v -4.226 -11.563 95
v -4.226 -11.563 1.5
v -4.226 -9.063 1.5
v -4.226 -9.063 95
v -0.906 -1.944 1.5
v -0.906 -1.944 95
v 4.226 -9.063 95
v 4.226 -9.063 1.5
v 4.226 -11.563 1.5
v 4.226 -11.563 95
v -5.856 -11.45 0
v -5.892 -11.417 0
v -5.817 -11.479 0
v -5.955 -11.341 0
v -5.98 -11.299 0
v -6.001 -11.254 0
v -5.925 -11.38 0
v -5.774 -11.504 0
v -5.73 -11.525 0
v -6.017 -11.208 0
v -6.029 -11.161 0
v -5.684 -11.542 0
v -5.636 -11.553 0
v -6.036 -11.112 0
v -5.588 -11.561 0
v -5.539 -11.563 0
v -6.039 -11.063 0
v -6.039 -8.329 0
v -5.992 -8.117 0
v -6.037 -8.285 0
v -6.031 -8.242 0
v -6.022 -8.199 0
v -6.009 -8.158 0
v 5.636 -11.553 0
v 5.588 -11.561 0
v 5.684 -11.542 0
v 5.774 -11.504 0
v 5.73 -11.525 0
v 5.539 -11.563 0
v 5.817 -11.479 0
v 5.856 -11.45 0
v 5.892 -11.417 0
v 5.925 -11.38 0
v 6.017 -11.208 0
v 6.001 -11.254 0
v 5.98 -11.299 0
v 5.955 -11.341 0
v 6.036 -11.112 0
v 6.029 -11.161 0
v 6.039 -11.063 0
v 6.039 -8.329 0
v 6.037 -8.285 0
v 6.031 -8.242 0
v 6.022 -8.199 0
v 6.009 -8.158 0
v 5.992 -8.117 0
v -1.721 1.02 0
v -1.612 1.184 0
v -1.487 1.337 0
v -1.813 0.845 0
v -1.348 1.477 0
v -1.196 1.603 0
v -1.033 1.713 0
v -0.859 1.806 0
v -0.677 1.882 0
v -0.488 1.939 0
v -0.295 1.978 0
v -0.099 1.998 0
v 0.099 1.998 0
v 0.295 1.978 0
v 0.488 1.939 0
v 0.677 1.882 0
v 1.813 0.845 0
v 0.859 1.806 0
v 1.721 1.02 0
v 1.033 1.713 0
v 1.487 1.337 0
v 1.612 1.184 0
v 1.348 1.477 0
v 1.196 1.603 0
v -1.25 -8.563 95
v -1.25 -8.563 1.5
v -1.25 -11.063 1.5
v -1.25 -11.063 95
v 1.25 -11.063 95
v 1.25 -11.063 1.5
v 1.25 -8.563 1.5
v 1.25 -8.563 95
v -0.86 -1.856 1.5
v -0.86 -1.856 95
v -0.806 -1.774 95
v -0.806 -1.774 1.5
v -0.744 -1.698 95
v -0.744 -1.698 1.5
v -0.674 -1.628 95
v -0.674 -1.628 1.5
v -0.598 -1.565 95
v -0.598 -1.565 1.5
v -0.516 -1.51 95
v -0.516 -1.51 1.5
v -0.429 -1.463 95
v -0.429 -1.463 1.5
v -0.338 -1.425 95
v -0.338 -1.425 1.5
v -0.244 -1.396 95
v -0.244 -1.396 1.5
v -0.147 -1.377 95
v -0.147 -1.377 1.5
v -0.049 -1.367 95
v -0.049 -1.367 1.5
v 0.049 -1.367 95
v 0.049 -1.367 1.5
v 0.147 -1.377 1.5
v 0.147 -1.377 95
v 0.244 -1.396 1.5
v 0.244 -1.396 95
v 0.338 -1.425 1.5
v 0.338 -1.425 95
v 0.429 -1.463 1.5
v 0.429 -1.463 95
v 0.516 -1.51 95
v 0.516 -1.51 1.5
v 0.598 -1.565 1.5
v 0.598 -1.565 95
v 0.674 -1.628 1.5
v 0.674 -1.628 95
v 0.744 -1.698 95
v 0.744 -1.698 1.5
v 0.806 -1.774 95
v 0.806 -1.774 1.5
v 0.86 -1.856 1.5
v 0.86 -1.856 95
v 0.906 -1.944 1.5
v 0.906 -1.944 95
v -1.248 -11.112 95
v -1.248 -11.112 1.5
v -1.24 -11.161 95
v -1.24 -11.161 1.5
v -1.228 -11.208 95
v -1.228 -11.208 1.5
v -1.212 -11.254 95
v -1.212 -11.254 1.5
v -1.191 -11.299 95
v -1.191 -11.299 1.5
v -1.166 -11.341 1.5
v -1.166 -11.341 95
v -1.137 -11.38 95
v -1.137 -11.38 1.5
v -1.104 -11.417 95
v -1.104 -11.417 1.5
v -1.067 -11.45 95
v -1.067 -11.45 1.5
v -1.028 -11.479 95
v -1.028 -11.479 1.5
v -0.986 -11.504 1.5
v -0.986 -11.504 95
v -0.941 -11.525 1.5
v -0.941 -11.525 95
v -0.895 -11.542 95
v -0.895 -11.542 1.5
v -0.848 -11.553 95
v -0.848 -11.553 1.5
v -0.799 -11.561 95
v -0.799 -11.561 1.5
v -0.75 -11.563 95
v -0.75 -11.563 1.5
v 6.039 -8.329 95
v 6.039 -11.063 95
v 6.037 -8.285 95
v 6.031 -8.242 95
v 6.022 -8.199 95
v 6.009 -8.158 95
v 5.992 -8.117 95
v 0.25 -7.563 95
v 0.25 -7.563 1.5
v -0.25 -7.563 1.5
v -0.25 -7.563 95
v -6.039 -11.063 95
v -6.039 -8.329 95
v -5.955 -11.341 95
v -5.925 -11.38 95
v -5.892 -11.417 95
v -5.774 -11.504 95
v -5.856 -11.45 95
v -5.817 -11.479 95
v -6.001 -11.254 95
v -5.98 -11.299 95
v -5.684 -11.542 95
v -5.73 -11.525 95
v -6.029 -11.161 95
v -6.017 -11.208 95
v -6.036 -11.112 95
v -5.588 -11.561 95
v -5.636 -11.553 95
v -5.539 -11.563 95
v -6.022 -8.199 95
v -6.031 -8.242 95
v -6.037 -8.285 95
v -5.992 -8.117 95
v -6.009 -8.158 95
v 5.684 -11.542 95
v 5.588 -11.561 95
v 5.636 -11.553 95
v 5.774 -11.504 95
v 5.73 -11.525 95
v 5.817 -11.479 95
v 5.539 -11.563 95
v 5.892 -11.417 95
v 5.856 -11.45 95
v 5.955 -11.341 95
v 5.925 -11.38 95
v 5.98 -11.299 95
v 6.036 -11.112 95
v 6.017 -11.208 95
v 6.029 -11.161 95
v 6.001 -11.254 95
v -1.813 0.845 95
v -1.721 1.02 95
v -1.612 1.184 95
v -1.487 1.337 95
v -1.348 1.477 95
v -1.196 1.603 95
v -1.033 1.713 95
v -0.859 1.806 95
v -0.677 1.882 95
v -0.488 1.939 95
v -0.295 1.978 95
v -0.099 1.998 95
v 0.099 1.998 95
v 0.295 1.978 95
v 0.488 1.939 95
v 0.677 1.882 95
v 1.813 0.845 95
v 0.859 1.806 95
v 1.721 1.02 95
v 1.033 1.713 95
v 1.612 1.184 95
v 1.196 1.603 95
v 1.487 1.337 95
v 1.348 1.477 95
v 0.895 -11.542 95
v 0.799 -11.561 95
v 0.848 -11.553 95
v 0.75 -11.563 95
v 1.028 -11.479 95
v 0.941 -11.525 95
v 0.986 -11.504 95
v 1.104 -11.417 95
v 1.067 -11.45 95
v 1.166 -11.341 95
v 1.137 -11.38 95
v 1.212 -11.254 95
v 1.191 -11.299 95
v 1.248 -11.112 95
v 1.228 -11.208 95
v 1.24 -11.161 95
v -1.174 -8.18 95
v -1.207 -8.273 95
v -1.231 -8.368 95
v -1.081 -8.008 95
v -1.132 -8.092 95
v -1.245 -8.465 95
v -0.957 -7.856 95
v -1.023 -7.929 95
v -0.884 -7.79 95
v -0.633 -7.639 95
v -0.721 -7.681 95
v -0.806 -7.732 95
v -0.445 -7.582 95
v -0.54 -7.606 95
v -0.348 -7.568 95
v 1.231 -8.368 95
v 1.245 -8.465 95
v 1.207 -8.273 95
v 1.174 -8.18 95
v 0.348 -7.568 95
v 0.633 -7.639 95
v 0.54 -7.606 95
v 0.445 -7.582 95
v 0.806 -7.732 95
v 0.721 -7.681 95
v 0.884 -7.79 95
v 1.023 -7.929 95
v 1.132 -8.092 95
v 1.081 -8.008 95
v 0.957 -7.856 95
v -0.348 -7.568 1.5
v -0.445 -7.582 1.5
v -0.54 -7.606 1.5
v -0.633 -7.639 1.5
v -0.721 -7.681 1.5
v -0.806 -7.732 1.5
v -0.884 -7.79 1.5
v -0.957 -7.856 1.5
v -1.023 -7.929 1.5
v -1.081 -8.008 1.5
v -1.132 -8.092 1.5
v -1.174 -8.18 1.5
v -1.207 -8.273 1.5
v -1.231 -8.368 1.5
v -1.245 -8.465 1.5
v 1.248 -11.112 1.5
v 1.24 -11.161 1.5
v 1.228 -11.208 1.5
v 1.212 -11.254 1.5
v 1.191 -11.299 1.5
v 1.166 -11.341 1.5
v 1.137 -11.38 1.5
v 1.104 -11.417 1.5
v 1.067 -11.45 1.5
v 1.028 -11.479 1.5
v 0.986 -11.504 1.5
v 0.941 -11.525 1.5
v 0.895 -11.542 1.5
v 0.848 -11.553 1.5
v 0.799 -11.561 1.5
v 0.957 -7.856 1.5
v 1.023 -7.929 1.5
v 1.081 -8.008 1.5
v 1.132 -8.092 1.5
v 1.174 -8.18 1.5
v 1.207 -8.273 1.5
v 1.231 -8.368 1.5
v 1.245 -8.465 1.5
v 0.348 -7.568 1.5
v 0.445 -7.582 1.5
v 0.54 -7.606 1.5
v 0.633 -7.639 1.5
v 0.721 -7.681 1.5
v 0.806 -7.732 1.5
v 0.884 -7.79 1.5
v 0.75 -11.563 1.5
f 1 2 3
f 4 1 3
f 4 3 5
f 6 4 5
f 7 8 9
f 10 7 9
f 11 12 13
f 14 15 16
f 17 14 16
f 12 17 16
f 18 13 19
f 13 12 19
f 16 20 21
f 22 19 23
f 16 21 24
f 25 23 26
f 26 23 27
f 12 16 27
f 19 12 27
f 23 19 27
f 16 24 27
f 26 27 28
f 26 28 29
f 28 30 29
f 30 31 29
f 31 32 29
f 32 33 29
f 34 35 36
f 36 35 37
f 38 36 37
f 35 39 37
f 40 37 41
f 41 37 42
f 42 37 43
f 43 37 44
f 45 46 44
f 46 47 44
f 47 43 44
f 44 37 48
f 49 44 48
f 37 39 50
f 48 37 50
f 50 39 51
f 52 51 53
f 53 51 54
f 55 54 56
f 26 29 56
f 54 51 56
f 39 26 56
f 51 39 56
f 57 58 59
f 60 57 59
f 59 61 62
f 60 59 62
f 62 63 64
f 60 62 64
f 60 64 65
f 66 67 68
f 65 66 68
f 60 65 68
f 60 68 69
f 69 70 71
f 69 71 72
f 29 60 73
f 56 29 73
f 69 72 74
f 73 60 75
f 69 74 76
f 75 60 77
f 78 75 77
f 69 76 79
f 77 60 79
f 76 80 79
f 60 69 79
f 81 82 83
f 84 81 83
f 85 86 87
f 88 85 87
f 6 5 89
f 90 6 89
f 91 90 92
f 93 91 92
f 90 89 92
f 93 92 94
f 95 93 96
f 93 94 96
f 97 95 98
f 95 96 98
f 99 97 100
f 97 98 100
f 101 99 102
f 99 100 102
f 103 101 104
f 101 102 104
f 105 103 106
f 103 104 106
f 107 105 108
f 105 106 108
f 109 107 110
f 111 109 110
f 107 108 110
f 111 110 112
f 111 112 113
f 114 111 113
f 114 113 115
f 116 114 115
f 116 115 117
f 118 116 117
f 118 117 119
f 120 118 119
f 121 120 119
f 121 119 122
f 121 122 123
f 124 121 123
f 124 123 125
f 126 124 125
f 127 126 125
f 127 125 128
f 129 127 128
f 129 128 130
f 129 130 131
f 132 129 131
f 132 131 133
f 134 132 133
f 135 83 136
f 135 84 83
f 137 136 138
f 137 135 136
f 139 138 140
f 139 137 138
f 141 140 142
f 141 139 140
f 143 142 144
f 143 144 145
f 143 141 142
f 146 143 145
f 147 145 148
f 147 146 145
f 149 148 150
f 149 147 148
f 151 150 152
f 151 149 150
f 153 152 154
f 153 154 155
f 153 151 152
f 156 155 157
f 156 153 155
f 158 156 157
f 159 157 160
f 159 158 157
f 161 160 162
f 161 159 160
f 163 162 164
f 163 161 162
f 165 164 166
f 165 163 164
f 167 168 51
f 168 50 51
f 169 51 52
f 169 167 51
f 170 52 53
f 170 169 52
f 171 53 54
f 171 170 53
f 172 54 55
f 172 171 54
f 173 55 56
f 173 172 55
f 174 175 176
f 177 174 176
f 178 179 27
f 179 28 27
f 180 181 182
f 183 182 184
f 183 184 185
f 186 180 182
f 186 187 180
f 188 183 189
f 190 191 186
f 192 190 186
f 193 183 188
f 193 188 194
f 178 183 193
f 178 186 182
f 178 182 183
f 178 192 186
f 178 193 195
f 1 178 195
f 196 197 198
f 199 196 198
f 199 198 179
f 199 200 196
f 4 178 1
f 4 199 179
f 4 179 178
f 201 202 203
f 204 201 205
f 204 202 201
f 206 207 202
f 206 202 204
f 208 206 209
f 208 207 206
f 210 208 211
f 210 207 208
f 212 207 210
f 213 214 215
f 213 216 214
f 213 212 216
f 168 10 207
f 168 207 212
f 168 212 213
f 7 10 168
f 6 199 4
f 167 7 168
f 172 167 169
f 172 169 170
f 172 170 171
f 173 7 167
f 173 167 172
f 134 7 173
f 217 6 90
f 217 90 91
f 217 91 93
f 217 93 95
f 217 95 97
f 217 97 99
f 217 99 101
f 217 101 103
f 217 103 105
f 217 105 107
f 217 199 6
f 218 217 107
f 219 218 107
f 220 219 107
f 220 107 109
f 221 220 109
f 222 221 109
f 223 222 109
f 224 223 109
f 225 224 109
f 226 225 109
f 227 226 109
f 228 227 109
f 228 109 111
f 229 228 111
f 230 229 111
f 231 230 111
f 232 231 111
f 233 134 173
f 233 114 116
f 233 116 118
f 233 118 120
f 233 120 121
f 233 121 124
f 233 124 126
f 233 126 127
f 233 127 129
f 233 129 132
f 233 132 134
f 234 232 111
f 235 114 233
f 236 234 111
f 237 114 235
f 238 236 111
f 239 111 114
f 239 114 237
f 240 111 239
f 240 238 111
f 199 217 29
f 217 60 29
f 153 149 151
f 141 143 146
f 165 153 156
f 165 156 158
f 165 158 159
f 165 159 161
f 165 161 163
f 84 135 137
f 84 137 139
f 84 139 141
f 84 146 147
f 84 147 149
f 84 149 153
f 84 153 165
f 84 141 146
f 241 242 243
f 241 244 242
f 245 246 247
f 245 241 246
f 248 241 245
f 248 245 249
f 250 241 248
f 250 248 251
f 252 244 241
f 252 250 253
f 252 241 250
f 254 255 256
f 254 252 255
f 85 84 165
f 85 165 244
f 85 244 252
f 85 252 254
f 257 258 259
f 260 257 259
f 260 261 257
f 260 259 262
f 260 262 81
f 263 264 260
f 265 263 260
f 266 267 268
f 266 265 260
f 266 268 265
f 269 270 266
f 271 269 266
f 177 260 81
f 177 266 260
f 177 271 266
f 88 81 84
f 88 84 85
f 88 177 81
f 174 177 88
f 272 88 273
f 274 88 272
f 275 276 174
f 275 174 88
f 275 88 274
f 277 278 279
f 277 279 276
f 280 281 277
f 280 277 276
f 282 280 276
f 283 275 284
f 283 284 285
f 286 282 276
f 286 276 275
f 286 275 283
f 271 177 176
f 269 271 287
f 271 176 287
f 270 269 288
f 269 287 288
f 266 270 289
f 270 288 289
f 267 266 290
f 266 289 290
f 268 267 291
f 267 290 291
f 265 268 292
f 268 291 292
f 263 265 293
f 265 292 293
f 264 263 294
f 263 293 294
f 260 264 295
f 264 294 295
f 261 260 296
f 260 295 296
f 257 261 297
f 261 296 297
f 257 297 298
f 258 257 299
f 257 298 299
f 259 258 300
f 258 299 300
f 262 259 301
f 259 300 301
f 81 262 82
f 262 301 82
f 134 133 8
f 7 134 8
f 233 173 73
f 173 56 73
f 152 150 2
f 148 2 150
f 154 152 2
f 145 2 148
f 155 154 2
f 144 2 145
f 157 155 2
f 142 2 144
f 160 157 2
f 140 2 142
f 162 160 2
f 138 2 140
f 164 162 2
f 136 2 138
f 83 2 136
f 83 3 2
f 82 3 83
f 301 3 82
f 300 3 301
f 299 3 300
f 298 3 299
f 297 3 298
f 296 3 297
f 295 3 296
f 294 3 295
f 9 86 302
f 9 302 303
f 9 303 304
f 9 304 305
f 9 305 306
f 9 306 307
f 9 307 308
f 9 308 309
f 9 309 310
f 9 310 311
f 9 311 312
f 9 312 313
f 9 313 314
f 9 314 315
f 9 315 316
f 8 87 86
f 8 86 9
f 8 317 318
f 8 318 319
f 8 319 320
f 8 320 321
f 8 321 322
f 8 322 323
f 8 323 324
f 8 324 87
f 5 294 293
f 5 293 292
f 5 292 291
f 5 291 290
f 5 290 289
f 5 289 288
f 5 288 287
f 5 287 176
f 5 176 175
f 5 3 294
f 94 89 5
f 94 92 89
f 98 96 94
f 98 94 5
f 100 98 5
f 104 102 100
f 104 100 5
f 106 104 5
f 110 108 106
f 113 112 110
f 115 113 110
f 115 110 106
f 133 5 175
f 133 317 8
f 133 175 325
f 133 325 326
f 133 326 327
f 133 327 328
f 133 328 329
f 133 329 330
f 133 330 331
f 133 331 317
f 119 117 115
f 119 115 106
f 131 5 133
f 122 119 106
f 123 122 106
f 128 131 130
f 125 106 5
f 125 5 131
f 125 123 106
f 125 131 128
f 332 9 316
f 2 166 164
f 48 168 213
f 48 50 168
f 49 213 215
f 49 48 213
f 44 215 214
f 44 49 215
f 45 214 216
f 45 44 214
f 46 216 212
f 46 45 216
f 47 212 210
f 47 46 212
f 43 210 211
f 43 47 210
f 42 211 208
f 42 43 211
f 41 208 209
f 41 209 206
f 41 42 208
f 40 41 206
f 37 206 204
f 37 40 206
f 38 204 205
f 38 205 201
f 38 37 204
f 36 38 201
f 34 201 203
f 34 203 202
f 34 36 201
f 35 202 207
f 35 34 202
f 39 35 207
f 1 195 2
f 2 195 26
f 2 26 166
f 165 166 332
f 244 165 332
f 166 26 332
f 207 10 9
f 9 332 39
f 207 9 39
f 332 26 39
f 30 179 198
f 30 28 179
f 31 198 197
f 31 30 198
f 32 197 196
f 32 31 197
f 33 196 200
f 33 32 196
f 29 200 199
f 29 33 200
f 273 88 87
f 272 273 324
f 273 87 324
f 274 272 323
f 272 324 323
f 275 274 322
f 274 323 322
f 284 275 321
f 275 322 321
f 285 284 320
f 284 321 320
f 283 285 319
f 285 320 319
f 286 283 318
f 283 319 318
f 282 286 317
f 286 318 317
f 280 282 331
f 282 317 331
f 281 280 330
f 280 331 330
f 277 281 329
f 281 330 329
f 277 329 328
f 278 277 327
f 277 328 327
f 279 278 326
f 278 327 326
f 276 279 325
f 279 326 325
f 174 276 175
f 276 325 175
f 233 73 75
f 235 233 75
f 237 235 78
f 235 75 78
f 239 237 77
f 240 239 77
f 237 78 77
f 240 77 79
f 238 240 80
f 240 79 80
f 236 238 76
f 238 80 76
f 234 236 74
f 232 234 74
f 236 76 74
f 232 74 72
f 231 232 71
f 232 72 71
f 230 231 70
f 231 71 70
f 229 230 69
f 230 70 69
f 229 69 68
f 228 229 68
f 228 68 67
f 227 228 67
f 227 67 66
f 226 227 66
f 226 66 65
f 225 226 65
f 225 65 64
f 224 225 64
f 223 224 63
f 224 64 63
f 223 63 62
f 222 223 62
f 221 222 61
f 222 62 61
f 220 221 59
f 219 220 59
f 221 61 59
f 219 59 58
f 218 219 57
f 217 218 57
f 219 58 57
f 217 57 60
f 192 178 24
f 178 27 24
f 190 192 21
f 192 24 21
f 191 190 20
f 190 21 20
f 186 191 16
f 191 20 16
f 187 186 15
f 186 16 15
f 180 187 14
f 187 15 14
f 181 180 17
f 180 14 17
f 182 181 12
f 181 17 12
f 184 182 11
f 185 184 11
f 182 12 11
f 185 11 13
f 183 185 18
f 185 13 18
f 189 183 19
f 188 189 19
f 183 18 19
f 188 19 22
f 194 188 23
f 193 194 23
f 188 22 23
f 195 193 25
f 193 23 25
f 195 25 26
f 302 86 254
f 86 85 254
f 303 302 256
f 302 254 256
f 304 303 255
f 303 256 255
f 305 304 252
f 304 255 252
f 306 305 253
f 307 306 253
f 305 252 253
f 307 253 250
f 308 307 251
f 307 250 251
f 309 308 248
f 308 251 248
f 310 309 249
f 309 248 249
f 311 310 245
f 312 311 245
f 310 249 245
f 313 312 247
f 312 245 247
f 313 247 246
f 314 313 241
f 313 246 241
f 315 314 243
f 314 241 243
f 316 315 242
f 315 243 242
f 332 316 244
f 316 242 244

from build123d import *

# Parameters (mm, degrees)
F1_DEPTH = 1.5
F2_DEPTH = 95
F3_R     = 0.5


# Not quite as in the source:
# - a feature names something its author has since deleted; it is built from what else it names


with BuildPart() as f1:
    # F0 (on Top) → F1 (new body)
    with BuildSketch(Plane.XY):
        with BuildLine():
            ThreePointArc((0.906307787, -1.9435833214), (0, -1.3662015832), (-0.906307787, -1.9435833214))
            Line((-0.906307787, -1.9435833214), (-4.2261826174, -9.0630778704))
            Line((-4.2261826174, -9.0630778704), (-4.2261826174, -11.5630778704))
            Line((-4.2261826174, -11.5630778704), (-1.25, -11.5630778704))
            Line((-1.25, -11.5630778704), (-1.25, -8.5630778704))
            ThreePointArc((-1.25, -8.5630778704), (-0.9571067812, -7.8559710892), (-0.25, -7.5630778704))
            Line((-0.25, -7.5630778704), (0.25, -7.5630778704))
            ThreePointArc((0.25, -7.5630778704), (0.9571067812, -7.8559710892), (1.25, -8.5630778704))
            Line((1.25, -8.5630778704), (1.25, -11.5630778704))
            Line((1.25, -11.5630778704), (4.2261826174, -11.5630778704))
            Line((4.2261826174, -11.5630778704), (4.2261826174, -9.0630778704))
            Line((4.2261826174, -9.0630778704), (0.906307787, -1.9435833214))
        make_face()
        with BuildLine():
            Line((-4.2261826174, -9.0630778704), (-0.906307787, -1.9435833214))
            ThreePointArc((-0.906307787, -1.9435833214), (0, -1.3662015832), (0.906307787, -1.9435833214))
            Line((0.906307787, -1.9435833214), (4.2261826174, -9.0630778704))
            Line((4.2261826174, -9.0630778704), (4.2261826174, -11.5630778704))
            Line((4.2261826174, -11.5630778704), (6.0387981915, -11.5630778704))
            Line((6.0387981915, -11.5630778704), (6.0387981915, -8.2178413469))
            Line((6.0387981915, -8.2178413469), (1.8126155741, 0.8452365235))
            ThreePointArc((1.8126155741, 0.8452365235), (0, 2), (-1.8126155741, 0.8452365235))
            Line((-1.8126155741, 0.8452365235), (-6.0387981915, -8.2178413469))
            Line((-6.0387981915, -8.2178413469), (-6.0387981915, -11.5630778704))
            Line((-6.0387981915, -11.5630778704), (-4.2261826174, -11.5630778704))
            Line((-4.2261826174, -11.5630778704), (-4.2261826174, -9.0630778704))
        make_face()
        with BuildLine():
            Line((-1.25, -8.5630778704), (-1.25, -11.5630778704))
            Line((-1.25, -11.5630778704), (1.25, -11.5630778704))
            Line((1.25, -11.5630778704), (1.25, -8.5630778704))
            ThreePointArc((1.25, -8.5630778704), (0.9571067812, -7.8559710892), (0.25, -7.5630778704))
            Line((0.25, -7.5630778704), (-0.25, -7.5630778704))
            ThreePointArc((-0.25, -7.5630778704), (-0.9571067812, -7.8559710892), (-1.25, -8.5630778704))
        make_face()
    extrude(amount=F1_DEPTH)

    # F0 (on Top) → F2 (join)
    with BuildSketch(Plane.XY):
        with BuildLine():
            Line((-4.2261826174, -9.0630778704), (-0.906307787, -1.9435833214))
            ThreePointArc((-0.906307787, -1.9435833214), (0, -1.3662015832), (0.906307787, -1.9435833214))
            Line((0.906307787, -1.9435833214), (4.2261826174, -9.0630778704))
            Line((4.2261826174, -9.0630778704), (4.2261826174, -11.5630778704))
            Line((4.2261826174, -11.5630778704), (6.0387981915, -11.5630778704))
            Line((6.0387981915, -11.5630778704), (6.0387981915, -8.2178413469))
            Line((6.0387981915, -8.2178413469), (1.8126155741, 0.8452365235))
            ThreePointArc((1.8126155741, 0.8452365235), (0, 2), (-1.8126155741, 0.8452365235))
            Line((-1.8126155741, 0.8452365235), (-6.0387981915, -8.2178413469))
            Line((-6.0387981915, -8.2178413469), (-6.0387981915, -11.5630778704))
            Line((-6.0387981915, -11.5630778704), (-4.2261826174, -11.5630778704))
            Line((-4.2261826174, -11.5630778704), (-4.2261826174, -9.0630778704))
        make_face()
        with BuildLine():
            Line((-1.25, -8.5630778704), (-1.25, -11.5630778704))
            Line((-1.25, -11.5630778704), (1.25, -11.5630778704))
            Line((1.25, -11.5630778704), (1.25, -8.5630778704))
            ThreePointArc((1.25, -8.5630778704), (0.9571067812, -7.8559710892), (0.25, -7.5630778704))
            Line((0.25, -7.5630778704), (-0.25, -7.5630778704))
            ThreePointArc((-0.25, -7.5630778704), (-0.9571067812, -7.8559710892), (-1.25, -8.5630778704))
        make_face()
    extrude(amount=F2_DEPTH)

    # F3
    f3_edges = [f1.edges().sort_by_distance(p)[0] for p in [
        (-6.038798, -8.217841, 47.5),
        (-6.038798, -11.563078, 47.5),
        (6.038798, -8.217841, 47.5),
        (6.038798, -11.563078, 47.5),
        (-1.25, -11.563078, 48.25),
        (1.25, -11.563078, 48.25),
    ]]
    fillet(f3_edges, radius=F3_R)


solid = f1.part
